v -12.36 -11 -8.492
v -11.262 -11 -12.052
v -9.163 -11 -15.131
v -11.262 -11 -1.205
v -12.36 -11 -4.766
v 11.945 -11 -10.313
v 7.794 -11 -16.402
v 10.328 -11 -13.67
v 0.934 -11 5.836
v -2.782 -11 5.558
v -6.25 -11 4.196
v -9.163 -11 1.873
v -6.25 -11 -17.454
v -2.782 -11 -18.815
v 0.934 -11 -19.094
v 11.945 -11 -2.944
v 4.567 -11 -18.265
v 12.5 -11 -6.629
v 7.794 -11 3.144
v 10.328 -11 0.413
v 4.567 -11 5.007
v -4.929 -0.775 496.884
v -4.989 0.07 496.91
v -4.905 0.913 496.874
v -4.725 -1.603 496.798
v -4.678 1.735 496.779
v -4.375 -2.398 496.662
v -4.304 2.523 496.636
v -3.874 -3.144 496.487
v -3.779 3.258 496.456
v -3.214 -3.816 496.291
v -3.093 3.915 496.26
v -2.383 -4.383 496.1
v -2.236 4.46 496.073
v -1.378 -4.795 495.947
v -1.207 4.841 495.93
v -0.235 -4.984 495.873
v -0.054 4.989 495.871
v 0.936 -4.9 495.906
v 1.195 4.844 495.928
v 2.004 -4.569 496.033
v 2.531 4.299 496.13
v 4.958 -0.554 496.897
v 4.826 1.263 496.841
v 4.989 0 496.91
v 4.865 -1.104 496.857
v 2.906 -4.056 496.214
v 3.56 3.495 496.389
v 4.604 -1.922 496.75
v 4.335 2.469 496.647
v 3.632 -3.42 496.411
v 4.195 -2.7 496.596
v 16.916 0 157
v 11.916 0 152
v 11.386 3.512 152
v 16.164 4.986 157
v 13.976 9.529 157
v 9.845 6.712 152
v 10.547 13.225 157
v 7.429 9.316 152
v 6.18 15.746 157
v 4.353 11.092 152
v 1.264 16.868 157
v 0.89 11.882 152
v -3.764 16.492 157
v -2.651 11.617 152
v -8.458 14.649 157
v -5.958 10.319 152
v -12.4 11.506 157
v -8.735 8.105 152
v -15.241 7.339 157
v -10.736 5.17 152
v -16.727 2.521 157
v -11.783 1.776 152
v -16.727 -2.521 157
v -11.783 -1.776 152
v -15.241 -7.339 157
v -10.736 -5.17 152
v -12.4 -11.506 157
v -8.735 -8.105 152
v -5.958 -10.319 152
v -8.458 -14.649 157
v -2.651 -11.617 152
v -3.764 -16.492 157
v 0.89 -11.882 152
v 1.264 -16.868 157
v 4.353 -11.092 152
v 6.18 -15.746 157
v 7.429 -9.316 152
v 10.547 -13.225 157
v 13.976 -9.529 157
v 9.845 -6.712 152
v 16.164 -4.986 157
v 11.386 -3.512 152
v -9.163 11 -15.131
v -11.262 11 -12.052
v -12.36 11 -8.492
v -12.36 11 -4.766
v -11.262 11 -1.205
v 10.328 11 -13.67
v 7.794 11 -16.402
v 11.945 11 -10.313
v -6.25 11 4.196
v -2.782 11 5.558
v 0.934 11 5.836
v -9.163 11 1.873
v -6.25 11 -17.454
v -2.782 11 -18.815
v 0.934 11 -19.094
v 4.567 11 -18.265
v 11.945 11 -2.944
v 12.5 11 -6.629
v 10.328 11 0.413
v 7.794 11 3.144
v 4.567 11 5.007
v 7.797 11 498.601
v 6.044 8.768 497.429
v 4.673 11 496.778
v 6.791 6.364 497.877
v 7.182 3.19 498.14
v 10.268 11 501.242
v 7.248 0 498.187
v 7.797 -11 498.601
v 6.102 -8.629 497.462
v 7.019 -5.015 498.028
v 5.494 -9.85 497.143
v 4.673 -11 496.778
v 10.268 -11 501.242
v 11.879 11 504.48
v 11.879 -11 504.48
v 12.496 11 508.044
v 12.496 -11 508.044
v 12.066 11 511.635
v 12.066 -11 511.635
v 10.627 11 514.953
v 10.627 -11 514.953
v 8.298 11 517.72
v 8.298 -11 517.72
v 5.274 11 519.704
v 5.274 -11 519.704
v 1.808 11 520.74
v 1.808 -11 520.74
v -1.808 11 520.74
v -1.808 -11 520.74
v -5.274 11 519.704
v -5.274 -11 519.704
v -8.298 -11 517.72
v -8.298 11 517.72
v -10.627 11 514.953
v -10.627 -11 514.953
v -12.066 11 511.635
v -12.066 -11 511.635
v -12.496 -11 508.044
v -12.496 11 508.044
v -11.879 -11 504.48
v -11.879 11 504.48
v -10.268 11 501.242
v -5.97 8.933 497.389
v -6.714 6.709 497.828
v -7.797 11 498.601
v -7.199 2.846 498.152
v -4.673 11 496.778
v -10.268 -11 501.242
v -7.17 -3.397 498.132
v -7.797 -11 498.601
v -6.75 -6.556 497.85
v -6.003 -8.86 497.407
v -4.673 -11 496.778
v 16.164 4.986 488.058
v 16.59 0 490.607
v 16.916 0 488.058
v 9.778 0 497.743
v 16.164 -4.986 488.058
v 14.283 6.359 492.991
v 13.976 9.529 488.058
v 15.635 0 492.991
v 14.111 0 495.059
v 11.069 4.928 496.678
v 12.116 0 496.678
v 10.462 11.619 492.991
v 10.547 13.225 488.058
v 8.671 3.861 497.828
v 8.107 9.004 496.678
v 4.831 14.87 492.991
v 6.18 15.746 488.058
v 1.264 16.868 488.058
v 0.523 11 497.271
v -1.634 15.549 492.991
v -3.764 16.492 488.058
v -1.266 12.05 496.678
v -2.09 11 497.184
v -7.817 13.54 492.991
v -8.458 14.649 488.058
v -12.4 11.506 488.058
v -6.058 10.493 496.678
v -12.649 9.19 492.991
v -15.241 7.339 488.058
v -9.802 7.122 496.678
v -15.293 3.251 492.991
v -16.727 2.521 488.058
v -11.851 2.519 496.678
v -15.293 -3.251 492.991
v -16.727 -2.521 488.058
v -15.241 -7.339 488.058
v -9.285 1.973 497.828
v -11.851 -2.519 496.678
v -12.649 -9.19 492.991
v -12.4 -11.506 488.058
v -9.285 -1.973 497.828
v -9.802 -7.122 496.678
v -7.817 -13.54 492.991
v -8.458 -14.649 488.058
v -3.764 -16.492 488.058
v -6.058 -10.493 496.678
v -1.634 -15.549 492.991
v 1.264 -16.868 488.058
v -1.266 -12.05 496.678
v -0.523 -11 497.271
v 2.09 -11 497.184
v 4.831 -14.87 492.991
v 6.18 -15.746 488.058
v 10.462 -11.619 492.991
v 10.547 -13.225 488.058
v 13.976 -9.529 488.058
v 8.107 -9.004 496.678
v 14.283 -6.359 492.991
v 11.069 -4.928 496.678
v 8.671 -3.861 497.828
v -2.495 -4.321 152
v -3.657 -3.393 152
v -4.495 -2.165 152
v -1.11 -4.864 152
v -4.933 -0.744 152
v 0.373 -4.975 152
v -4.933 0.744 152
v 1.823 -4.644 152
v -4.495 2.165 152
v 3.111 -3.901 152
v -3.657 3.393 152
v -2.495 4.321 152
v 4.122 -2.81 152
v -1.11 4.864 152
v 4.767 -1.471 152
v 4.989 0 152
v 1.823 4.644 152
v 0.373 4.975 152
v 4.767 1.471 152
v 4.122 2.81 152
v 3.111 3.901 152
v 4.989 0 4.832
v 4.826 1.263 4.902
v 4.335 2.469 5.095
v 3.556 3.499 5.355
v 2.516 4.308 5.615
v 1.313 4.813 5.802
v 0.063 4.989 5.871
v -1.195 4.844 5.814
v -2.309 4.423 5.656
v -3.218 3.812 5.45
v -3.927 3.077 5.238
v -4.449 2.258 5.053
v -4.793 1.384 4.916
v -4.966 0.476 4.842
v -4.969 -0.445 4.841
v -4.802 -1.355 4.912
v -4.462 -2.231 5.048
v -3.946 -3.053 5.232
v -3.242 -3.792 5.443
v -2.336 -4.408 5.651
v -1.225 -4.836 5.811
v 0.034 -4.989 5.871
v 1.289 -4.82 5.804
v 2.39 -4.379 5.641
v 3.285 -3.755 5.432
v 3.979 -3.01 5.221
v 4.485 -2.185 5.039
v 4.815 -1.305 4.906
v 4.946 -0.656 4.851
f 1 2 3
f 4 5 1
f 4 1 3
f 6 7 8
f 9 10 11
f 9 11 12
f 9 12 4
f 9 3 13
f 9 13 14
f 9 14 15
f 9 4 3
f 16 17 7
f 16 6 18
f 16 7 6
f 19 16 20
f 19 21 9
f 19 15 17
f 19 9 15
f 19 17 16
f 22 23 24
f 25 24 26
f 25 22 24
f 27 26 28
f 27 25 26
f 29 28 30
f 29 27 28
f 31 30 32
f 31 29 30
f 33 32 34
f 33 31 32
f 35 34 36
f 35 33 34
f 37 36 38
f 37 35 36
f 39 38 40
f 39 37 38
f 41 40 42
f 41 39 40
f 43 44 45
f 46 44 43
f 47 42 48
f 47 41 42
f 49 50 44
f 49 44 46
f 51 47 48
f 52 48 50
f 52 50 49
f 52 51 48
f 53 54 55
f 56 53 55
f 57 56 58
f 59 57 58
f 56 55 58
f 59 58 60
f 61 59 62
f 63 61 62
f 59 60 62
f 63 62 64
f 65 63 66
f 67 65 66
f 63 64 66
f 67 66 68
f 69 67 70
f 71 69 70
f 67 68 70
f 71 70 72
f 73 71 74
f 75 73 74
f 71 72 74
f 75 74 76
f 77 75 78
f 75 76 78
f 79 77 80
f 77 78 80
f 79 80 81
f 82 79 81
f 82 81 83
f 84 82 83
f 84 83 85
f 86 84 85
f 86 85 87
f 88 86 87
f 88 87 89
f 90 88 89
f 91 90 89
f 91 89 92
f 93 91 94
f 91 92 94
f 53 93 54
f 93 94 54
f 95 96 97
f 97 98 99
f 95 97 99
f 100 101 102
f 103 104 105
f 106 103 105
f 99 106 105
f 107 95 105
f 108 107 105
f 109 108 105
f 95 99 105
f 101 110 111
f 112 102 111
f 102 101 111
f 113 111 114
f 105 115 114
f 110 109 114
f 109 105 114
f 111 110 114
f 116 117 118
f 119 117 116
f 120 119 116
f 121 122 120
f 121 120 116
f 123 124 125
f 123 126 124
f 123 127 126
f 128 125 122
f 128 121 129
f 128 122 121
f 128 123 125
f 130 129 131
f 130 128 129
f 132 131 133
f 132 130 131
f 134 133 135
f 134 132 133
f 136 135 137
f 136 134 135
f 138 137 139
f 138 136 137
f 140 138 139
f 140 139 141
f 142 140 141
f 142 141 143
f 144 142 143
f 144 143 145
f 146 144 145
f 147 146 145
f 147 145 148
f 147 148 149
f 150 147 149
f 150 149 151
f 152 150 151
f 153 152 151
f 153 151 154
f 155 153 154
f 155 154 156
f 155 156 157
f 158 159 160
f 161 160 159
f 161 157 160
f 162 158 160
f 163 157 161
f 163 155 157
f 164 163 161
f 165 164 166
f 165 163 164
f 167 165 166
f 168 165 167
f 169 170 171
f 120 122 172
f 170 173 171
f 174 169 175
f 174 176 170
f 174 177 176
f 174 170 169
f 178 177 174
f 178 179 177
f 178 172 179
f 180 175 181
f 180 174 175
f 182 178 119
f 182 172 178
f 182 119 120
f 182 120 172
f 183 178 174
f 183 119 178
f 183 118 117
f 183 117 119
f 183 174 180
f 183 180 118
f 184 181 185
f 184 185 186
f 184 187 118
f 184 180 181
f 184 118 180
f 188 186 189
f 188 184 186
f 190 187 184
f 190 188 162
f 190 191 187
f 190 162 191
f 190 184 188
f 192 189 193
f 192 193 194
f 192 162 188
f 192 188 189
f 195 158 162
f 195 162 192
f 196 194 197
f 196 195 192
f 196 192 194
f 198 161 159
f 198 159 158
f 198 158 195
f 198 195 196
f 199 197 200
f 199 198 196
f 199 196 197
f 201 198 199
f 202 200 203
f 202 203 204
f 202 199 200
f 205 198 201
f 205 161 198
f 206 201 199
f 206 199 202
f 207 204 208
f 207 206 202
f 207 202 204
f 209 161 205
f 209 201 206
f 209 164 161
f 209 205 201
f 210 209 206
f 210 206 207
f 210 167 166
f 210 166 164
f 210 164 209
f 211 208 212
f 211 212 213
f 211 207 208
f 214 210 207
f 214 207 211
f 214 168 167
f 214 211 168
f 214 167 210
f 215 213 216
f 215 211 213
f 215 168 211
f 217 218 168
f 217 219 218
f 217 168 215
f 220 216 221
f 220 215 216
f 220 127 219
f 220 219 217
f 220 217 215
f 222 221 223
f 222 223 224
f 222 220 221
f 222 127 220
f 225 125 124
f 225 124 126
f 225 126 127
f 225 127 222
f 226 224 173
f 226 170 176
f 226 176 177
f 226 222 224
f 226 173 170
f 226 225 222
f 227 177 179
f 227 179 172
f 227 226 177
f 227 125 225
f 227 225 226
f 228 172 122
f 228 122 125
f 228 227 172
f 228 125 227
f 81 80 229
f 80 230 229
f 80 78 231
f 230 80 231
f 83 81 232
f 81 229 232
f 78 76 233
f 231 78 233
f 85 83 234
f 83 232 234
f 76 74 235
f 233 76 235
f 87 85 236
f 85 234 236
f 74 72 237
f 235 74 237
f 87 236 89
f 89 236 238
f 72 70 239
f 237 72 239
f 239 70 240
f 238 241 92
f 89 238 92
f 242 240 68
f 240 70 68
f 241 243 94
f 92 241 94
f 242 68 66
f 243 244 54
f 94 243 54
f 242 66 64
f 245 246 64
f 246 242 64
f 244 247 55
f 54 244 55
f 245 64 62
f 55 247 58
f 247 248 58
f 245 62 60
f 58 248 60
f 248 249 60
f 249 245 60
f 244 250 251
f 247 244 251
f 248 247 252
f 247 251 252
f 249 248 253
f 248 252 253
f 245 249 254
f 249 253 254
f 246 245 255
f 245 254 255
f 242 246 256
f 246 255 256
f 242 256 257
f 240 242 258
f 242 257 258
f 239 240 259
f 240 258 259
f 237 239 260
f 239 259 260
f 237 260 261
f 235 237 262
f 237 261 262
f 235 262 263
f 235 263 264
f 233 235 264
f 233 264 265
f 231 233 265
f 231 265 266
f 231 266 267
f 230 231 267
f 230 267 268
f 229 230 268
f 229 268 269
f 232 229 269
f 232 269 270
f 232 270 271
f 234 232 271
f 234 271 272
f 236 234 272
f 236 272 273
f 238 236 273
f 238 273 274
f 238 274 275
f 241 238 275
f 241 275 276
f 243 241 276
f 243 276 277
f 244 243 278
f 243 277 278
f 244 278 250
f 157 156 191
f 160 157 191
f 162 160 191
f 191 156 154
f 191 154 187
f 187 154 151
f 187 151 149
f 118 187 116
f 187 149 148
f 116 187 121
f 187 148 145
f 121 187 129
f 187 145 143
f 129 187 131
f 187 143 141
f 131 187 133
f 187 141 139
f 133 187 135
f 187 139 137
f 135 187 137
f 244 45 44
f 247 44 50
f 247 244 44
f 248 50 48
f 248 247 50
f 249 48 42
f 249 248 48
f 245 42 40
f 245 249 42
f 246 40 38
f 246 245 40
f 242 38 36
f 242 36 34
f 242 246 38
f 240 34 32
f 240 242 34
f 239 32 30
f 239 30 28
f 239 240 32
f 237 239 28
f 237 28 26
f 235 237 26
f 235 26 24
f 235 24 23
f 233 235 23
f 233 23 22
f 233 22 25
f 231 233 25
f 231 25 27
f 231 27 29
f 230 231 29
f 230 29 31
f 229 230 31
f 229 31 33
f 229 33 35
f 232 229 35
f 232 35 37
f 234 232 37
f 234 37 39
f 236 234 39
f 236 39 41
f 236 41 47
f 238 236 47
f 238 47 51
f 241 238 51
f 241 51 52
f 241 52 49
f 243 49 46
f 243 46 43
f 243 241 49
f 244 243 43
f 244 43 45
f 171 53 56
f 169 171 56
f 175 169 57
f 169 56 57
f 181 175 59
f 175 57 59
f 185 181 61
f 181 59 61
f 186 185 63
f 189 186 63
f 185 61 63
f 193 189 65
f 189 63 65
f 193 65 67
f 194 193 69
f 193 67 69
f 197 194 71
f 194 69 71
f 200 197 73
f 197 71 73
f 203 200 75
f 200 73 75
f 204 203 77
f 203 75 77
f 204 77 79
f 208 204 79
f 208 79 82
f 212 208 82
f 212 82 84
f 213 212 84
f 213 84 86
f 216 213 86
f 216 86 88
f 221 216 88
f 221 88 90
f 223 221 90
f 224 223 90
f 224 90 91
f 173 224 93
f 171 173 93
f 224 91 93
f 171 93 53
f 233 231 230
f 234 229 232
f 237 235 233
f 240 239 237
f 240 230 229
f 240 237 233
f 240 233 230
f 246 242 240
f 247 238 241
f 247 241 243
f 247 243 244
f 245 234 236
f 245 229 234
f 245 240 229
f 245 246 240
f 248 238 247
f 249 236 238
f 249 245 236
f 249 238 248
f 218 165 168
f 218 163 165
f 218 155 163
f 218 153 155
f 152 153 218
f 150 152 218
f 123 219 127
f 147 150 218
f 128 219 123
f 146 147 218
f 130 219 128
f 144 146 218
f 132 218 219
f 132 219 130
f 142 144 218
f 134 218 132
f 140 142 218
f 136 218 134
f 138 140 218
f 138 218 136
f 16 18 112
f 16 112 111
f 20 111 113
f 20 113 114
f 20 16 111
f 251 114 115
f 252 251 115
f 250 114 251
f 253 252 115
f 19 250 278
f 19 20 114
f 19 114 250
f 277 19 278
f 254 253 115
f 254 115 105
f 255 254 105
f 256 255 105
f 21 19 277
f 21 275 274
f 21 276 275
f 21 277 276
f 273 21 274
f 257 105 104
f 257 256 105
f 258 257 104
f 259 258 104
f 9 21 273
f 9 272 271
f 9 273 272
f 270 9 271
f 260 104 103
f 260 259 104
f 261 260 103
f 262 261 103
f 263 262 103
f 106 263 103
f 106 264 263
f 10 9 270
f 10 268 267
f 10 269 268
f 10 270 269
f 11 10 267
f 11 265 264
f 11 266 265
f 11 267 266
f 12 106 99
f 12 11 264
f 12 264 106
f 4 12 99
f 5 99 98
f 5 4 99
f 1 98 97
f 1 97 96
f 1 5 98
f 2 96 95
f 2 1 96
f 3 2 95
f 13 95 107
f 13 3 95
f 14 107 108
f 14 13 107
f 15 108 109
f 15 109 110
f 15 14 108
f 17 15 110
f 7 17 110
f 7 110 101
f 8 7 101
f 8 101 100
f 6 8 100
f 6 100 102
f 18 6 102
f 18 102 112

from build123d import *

# Parameters (mm, degrees)
F0_R     = 4.9890493126
F1_DEPTH = 152
F3_R     = 16.915720731
F3_R_2   = 4.9890493126
F4_DEPTH = 346.1980521679
F5_R     = 10.139696962
F6_SIZE  = 5
F2_R     = 12.5
F7_DEPTH = 11


with BuildPart() as f1:
    # F0 (on Top) → F1 (new body)
    with BuildSketch(Plane.XY):
        Circle(F0_R)
    extrude(amount=F1_DEPTH)

    # F2 (on Front) → F7 (join, symmetric)
    with BuildSketch(Plane.XZ):
        with Locations((0, -6.628853715)):
            Circle(F2_R)
    extrude(amount=F7_DEPTH, both=True)


with BuildPart() as f4:
    # F3 (on face) → F4 (new body)
    with BuildSketch(Plane.XY.offset(152)):
        Circle(F3_R)
        Circle(F3_R_2, mode=Mode.SUBTRACT)
    extrude(amount=F4_DEPTH)

    # F5
    f5_edges = [f4.edges().sort_by_distance(p)[0] for p in [
        (-16.915721, 0, 498.198052),
    ]]
    fillet(f5_edges, radius=F5_R)

    # F6
    f6_edges = [f4.edges().sort_by_distance(p)[0] for p in [
        (-16.915721, 0, 152),
    ]]
    chamfer(f6_edges, length=F6_SIZE)

    # F2 (on Front) → F7, piece 2 (join, symmetric)
    with BuildSketch(Plane.XZ):
        with Locations((0, 508.371146285)):
            Circle(F2_R)
    extrude(amount=F7_DEPTH, both=True)


solid = Compound([f1.part, f4.part])
